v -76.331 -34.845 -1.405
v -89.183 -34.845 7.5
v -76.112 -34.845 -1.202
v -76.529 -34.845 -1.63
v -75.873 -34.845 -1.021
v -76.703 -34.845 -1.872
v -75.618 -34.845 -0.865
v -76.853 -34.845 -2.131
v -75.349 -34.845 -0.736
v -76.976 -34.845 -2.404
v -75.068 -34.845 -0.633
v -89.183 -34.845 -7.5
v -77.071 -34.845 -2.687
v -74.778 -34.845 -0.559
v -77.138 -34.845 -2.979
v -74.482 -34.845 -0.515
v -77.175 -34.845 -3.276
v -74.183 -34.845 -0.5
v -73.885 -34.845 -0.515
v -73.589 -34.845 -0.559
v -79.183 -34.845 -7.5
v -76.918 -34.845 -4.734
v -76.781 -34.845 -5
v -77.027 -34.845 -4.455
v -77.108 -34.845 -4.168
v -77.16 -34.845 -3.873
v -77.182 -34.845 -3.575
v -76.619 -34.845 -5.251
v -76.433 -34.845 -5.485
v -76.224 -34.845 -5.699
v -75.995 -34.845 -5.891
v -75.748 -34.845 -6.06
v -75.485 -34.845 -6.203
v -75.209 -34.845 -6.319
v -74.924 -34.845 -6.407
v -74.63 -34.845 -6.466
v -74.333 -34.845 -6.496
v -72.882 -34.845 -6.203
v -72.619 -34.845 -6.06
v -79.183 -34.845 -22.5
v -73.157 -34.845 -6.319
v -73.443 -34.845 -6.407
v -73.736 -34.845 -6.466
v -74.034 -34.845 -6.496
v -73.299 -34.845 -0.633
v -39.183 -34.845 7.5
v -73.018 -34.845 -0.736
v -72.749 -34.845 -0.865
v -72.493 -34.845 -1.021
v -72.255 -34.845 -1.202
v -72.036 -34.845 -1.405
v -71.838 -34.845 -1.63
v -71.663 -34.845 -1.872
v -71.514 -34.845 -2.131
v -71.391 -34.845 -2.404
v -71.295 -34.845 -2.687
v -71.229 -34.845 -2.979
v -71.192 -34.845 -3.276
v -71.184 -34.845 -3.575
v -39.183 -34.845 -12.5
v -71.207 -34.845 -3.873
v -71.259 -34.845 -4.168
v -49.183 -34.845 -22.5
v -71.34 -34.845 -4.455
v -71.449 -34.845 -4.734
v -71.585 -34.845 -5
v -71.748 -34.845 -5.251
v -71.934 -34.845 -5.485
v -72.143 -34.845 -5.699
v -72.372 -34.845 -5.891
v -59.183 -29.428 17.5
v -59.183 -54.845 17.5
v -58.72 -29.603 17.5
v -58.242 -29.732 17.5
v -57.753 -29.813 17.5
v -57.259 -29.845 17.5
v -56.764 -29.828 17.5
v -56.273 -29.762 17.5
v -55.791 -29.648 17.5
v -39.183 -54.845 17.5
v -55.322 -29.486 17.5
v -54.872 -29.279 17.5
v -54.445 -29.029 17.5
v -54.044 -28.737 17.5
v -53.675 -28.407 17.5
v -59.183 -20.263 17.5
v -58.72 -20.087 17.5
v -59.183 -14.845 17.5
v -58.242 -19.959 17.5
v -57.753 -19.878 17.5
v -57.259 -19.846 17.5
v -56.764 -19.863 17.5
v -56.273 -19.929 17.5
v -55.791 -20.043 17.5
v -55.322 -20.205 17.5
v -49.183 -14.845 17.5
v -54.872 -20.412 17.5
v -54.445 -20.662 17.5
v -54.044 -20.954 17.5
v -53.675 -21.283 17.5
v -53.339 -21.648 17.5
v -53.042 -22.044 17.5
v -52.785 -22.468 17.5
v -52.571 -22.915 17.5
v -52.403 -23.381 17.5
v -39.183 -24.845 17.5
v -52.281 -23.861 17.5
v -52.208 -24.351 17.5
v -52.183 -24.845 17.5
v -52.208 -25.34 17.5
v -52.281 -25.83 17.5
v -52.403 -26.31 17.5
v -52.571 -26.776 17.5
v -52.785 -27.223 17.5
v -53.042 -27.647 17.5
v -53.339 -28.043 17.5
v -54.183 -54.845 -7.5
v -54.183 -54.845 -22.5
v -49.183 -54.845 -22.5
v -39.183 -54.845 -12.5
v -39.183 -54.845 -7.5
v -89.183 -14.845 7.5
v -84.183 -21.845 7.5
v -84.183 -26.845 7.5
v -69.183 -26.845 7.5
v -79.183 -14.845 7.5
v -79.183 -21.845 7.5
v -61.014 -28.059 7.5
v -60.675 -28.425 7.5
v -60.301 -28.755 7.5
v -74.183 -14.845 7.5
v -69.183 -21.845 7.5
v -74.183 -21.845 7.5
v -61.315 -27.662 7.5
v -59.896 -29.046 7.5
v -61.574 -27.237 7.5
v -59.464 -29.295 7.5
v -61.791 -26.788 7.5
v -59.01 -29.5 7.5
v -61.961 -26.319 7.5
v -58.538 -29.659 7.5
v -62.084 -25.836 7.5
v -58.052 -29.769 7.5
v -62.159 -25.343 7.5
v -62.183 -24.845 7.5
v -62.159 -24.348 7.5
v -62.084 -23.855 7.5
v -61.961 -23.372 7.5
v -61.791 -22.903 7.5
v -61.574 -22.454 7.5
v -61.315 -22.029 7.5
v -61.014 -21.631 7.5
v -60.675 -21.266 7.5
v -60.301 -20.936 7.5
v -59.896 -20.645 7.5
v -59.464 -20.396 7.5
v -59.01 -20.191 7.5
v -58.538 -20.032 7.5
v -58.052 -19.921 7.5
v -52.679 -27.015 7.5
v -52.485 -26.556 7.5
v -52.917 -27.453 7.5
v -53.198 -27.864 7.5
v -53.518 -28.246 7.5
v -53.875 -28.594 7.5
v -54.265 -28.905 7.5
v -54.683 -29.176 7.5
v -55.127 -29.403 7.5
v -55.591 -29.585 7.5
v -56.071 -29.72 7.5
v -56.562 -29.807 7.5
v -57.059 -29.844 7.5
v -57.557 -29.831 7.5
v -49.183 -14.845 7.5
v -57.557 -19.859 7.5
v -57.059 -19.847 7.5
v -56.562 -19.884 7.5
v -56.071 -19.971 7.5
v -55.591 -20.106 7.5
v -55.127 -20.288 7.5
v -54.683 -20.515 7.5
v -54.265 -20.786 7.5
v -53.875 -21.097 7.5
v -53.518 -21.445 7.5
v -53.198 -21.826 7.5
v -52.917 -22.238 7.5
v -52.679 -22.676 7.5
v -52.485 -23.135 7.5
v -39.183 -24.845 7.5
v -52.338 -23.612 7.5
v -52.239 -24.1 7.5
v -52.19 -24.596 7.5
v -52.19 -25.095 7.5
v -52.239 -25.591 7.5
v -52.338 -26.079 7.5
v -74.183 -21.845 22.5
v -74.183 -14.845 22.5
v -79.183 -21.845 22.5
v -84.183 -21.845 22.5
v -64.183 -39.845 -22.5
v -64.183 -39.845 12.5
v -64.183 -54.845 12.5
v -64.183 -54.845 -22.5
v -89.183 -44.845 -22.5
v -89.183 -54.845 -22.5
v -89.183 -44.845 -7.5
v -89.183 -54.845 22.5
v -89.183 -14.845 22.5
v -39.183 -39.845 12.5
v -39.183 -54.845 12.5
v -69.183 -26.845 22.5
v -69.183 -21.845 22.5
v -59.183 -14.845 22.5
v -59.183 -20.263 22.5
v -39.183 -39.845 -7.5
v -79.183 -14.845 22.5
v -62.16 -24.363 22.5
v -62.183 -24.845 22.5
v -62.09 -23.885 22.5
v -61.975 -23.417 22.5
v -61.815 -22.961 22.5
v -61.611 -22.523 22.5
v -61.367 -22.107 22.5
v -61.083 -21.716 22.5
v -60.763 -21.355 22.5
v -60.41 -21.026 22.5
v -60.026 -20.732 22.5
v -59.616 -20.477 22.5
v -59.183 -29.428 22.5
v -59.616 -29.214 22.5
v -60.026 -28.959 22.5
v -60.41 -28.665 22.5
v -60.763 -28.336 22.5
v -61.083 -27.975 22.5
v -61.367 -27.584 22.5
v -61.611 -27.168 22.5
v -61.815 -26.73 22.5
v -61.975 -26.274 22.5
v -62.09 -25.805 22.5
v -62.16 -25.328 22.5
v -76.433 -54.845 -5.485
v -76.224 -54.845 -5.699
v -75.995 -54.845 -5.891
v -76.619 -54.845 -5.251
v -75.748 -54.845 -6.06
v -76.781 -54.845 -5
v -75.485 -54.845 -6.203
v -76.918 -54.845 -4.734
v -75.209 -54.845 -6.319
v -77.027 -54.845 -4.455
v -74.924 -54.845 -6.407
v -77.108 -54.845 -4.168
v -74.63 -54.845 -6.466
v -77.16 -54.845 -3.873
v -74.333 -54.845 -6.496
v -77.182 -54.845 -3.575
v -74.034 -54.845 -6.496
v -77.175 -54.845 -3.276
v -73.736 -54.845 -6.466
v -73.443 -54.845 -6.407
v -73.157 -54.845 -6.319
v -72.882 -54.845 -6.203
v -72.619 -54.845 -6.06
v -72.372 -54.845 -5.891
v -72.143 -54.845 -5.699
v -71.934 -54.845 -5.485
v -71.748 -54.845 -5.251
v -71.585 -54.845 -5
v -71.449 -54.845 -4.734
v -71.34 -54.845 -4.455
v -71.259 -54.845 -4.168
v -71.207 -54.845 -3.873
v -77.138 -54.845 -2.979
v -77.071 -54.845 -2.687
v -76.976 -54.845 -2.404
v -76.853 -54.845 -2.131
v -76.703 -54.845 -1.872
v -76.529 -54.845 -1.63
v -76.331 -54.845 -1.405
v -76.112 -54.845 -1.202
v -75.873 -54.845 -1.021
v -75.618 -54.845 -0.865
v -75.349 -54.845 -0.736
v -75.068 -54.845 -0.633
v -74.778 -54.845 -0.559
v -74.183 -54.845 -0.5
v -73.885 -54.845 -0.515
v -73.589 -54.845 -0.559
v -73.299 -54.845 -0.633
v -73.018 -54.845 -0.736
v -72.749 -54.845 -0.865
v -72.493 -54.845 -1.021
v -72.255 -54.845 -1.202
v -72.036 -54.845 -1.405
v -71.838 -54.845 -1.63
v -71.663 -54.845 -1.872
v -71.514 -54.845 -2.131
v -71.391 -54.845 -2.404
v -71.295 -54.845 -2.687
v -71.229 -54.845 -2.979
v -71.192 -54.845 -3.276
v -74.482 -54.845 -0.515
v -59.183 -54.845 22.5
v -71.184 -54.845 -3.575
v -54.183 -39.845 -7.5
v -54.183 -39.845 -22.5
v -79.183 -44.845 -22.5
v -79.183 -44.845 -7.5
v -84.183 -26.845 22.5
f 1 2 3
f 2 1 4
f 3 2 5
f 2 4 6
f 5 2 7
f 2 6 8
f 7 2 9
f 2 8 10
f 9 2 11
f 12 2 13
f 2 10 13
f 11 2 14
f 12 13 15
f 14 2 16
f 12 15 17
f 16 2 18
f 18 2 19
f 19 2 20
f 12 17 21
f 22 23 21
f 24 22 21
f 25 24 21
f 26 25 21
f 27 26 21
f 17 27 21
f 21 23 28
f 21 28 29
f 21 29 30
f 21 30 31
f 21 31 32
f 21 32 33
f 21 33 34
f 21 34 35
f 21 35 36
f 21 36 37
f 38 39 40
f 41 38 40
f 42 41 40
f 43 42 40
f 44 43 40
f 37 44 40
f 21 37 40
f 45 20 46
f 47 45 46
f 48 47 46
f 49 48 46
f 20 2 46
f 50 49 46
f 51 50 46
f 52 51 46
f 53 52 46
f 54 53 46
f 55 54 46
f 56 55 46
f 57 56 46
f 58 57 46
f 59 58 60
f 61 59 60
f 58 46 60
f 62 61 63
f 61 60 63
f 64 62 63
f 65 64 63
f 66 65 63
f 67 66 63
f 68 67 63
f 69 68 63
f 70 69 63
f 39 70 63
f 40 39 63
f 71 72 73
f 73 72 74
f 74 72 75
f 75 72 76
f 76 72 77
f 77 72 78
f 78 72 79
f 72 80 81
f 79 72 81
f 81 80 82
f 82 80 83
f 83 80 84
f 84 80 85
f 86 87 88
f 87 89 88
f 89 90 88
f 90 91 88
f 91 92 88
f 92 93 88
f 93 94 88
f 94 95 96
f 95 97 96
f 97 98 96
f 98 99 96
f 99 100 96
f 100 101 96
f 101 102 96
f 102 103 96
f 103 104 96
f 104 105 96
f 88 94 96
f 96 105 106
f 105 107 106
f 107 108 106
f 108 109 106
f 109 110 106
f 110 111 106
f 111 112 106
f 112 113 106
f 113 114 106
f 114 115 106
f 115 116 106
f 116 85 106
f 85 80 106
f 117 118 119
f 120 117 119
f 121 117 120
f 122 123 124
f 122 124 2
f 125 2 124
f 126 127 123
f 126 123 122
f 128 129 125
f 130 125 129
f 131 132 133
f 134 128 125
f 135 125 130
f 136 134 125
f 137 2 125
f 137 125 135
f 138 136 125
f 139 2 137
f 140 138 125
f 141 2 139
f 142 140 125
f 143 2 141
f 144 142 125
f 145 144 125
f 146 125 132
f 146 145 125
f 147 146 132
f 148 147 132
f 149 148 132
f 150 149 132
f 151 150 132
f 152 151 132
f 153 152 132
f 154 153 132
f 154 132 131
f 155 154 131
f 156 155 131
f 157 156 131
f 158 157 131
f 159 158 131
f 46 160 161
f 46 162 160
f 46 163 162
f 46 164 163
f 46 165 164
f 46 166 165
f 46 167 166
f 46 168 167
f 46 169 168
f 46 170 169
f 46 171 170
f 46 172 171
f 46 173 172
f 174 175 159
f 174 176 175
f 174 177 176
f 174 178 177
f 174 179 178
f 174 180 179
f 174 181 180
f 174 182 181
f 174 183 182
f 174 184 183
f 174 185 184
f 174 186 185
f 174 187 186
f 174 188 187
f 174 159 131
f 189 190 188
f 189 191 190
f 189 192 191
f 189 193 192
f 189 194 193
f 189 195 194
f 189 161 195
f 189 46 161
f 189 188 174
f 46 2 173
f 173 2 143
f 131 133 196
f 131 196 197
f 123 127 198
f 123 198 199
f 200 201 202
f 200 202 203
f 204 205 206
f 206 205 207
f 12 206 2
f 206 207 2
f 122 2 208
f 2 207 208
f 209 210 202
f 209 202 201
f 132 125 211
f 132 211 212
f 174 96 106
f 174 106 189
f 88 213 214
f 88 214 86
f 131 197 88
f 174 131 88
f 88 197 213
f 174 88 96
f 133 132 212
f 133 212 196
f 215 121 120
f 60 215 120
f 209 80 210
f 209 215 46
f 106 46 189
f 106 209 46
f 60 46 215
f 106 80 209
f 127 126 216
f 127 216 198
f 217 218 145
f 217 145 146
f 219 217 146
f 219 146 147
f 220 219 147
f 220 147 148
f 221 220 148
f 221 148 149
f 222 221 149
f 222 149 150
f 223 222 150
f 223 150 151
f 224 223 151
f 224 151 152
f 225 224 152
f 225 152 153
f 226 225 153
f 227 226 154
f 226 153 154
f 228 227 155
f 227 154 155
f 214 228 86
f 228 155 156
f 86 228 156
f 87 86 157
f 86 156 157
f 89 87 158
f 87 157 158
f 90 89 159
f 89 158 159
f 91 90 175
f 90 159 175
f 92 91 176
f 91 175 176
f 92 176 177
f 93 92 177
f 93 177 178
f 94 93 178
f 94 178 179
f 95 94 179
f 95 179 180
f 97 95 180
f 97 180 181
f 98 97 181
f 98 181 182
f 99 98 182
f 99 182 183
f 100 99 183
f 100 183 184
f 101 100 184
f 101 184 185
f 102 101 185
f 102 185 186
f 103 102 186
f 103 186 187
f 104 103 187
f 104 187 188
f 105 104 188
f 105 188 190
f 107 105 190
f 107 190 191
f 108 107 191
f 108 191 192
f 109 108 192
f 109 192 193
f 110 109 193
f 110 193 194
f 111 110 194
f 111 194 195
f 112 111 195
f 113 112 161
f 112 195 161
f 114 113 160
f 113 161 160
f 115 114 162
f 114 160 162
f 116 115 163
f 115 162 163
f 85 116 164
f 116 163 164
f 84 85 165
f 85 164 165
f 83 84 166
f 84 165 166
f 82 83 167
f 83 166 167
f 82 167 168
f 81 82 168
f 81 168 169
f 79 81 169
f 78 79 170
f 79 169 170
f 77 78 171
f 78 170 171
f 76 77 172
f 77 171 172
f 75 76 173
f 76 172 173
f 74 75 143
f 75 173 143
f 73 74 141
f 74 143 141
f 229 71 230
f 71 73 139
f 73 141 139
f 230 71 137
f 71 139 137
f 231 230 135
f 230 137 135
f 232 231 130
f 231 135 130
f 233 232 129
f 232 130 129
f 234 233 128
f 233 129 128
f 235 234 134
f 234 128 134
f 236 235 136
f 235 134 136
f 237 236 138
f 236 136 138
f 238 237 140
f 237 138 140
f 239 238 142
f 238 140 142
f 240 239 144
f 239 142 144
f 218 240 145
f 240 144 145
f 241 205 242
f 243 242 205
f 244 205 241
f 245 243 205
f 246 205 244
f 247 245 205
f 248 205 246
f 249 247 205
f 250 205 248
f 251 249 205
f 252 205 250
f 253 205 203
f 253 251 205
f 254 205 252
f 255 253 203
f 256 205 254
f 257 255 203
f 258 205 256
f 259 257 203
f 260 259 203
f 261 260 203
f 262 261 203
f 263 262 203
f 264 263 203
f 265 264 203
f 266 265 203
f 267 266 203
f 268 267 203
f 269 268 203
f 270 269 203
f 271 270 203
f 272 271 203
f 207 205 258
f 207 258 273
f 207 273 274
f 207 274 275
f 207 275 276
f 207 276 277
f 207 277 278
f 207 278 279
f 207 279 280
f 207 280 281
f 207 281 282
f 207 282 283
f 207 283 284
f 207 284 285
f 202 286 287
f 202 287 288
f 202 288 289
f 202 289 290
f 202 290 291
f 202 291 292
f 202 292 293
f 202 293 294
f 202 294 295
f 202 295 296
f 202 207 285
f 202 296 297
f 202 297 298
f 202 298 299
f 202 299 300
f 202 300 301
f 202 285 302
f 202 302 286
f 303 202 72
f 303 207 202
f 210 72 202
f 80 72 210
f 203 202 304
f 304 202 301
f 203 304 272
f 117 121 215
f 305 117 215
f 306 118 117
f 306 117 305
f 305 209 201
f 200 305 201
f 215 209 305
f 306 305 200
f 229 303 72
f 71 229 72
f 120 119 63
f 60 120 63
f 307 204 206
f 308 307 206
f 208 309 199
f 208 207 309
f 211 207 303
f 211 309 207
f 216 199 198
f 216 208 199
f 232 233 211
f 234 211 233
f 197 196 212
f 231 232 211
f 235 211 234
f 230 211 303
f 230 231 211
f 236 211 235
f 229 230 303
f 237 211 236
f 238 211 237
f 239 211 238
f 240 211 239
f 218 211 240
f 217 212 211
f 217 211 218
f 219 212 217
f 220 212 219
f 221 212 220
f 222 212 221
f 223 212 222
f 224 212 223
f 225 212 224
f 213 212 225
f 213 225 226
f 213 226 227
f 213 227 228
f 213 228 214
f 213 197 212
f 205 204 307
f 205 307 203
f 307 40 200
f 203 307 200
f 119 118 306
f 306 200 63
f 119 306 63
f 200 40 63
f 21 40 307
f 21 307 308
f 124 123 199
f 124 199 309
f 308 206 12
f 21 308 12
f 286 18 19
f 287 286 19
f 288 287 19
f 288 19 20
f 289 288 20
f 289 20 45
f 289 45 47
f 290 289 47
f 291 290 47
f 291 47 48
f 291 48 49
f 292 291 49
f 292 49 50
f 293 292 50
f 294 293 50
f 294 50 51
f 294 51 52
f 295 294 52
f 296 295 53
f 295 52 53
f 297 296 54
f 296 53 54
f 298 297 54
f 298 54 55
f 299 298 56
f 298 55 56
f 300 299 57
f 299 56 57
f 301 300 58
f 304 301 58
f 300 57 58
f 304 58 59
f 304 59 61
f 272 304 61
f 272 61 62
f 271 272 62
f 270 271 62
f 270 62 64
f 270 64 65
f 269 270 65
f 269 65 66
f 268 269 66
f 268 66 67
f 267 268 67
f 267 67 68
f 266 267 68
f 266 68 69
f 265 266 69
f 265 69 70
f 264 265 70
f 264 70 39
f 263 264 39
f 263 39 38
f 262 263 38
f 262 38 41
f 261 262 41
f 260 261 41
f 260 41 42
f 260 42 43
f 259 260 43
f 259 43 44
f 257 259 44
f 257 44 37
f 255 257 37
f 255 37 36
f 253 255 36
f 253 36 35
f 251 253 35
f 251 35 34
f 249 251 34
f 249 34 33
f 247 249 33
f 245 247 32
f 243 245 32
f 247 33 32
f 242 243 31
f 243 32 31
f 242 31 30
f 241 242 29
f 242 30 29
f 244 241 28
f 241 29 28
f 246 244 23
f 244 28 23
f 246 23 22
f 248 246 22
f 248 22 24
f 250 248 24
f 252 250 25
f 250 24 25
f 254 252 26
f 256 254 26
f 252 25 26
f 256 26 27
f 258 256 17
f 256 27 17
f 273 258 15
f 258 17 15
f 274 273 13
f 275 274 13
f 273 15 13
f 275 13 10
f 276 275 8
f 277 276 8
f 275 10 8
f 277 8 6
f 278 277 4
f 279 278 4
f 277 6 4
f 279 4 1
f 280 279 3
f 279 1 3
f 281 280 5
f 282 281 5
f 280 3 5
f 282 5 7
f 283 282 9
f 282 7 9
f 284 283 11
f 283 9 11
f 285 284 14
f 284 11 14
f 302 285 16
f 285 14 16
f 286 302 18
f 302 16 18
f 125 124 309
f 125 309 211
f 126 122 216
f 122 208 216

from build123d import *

# Parameters (mm, degrees)
ESQUISSE3_W             = 50
ESQUISSE3_H             = 40
BOSS_EXTRU_1_DEPTH      = 22.5
ESQUISSE7_W             = 30
ESQUISSE7_H             = 20
ENL_V_MAT_EXTRU_1_DEPTH = 78.551730665
ESQUISSE8_W             = 5
ESQUISSE8_H             = 40
ENL_V_MAT_EXTRU_2_DEPTH = 20
ESQUISSE9_W             = 15
ESQUISSE9_H             = 10
ENL_V_MAT_EXTRU_3_DEPTH = 10
CHANFREIN2_SIZE         = 10
CHANFREIN3_SIZE         = 10
ENL_V_MAT_EXTRU_4_DEPTH = 109.911404208
ESQUISSE11_W            = 20
ESQUISSE11_H            = 15
ENL_V_MAT_EXTRU_5_DEPTH = 25
ESQUISSE12_W            = 10
ESQUISSE12_H            = 15
ENL_V_MAT_EXTRU_6_DEPTH = 25
ESQUISSE14_R            = 3
ENL_V_MAT_EXTRU_7_DEPTH = 95.127164185
ESQUISSE15_R            = 5
ENL_V_MAT_EXTRU_8_DEPTH = 109.911404208


with BuildPart() as part:
    # Esquisse3 → Boss.-Extru.1 (new, symmetric)
    with BuildSketch(Plane.XY):
        with Locations((-64.183367493, -34.845427604)):
            Rectangle(ESQUISSE3_W, ESQUISSE3_H)
    extrude(amount=BOSS_EXTRU_1_DEPTH, both=True)

    # Esquisse7 → Enlèv. mat.-Extru.1 (cut, through all)
    with BuildSketch(Plane(origin=(-39.183367493, 0, 0), x_dir=(0, 0, -1), z_dir=(1, 0, 0))):
        with Locations((7.5, -24.845427604)):
            Rectangle(ESQUISSE7_W, ESQUISSE7_H)
    extrude(amount=-ENL_V_MAT_EXTRU_1_DEPTH, mode=Mode.SUBTRACT)

    # Esquisse8 → Enlèv. mat.-Extru.2 (cut)
    with BuildSketch(Plane(origin=(-39.183367493, 0, 0), x_dir=(0, 0, -1), z_dir=(1, 0, 0))):
        with Locations((-20, -34.845427604)):
            Rectangle(ESQUISSE8_W, ESQUISSE8_H)
    extrude(amount=-ENL_V_MAT_EXTRU_2_DEPTH, mode=Mode.SUBTRACT)

    # Esquisse9 → Enlèv. mat.-Extru.3 (cut)
    with BuildSketch(Plane.ZY.offset(89.183367493)):
        with Locations((-15, -39.845427604)):
            Rectangle(ESQUISSE9_W, ESQUISSE9_H)
    extrude(amount=-ENL_V_MAT_EXTRU_3_DEPTH, mode=Mode.SUBTRACT)

    # Chanfrein2
    chanfrein2_edges = [part.edges().sort_by_distance(p)[0] for p in [
        (-39.183367493, -14.845427604, 12.5),
    ]]
    chamfer(chanfrein2_edges, length=CHANFREIN2_SIZE)

    # Chanfrein3
    chanfrein3_edges = [part.edges().sort_by_distance(p)[0] for p in [
        (-39.183367493, -44.845427604, -22.5),
    ]]
    chamfer(chanfrein3_edges, length=CHANFREIN3_SIZE)

    # Esquisse10 → Enlèv. mat.-Extru.4 (cut, through all)
    with BuildSketch(Plane(origin=(0, 0, 7.5), x_dir=(-1, 0, 0), z_dir=(0, 0, -1))):
        Polygon((74.183367493, -14.845427604), (79.183367493, -14.845427604), (79.183367493, -21.845427604), (84.183367493, -21.845427604), (84.183367493, -26.845427604), (69.183367493, -26.845427604), (69.183367493, -21.845427604), (74.183367493, -21.845427604), align=None)
    extrude(amount=-ENL_V_MAT_EXTRU_4_DEPTH, mode=Mode.SUBTRACT)

    # Esquisse11 → Enlèv. mat.-Extru.5 (cut)
    with BuildSketch(Plane(origin=(-39.183367493, 0, 0), x_dir=(0, 0, -1), z_dir=(1, 0, 0))):
        with Locations((-2.5, -47.345427604)):
            Rectangle(ESQUISSE11_W, ESQUISSE11_H)
    extrude(amount=-ENL_V_MAT_EXTRU_5_DEPTH, mode=Mode.SUBTRACT)

    # Esquisse12 → Enlèv. mat.-Extru.6 (cut)
    with BuildSketch(Plane(origin=(0, 0, -22.5), x_dir=(-1, 0, 0), z_dir=(0, 0, -1))):
        with Locations((59.183367493, -47.345427604)):
            Rectangle(ESQUISSE12_W, ESQUISSE12_H)
    extrude(amount=-ENL_V_MAT_EXTRU_6_DEPTH, mode=Mode.SUBTRACT)

    # Esquisse14 → Enlèv. mat.-Extru.7 (cut, through all)
    with BuildSketch(Plane(origin=(0, -34.845427604, 0), x_dir=(1, 0, 0), z_dir=(0, 1, 0))):
        with Locations(Location((-74.183367493, 3.5, 0), (0, 0, 270))):
            Circle(ESQUISSE14_R)
    extrude(amount=-ENL_V_MAT_EXTRU_7_DEPTH, mode=Mode.SUBTRACT)

    # Esquisse15 → Enlèv. mat.-Extru.8 (cut, through all)
    with BuildSketch(Plane(origin=(0, 0, 7.5), x_dir=(-1, 0, 0), z_dir=(0, 0, -1))):
        with Locations((57.183367493, -24.845427604)):
            Circle(ESQUISSE15_R)
    extrude(amount=-ENL_V_MAT_EXTRU_8_DEPTH, mode=Mode.SUBTRACT)


solid = part.part
